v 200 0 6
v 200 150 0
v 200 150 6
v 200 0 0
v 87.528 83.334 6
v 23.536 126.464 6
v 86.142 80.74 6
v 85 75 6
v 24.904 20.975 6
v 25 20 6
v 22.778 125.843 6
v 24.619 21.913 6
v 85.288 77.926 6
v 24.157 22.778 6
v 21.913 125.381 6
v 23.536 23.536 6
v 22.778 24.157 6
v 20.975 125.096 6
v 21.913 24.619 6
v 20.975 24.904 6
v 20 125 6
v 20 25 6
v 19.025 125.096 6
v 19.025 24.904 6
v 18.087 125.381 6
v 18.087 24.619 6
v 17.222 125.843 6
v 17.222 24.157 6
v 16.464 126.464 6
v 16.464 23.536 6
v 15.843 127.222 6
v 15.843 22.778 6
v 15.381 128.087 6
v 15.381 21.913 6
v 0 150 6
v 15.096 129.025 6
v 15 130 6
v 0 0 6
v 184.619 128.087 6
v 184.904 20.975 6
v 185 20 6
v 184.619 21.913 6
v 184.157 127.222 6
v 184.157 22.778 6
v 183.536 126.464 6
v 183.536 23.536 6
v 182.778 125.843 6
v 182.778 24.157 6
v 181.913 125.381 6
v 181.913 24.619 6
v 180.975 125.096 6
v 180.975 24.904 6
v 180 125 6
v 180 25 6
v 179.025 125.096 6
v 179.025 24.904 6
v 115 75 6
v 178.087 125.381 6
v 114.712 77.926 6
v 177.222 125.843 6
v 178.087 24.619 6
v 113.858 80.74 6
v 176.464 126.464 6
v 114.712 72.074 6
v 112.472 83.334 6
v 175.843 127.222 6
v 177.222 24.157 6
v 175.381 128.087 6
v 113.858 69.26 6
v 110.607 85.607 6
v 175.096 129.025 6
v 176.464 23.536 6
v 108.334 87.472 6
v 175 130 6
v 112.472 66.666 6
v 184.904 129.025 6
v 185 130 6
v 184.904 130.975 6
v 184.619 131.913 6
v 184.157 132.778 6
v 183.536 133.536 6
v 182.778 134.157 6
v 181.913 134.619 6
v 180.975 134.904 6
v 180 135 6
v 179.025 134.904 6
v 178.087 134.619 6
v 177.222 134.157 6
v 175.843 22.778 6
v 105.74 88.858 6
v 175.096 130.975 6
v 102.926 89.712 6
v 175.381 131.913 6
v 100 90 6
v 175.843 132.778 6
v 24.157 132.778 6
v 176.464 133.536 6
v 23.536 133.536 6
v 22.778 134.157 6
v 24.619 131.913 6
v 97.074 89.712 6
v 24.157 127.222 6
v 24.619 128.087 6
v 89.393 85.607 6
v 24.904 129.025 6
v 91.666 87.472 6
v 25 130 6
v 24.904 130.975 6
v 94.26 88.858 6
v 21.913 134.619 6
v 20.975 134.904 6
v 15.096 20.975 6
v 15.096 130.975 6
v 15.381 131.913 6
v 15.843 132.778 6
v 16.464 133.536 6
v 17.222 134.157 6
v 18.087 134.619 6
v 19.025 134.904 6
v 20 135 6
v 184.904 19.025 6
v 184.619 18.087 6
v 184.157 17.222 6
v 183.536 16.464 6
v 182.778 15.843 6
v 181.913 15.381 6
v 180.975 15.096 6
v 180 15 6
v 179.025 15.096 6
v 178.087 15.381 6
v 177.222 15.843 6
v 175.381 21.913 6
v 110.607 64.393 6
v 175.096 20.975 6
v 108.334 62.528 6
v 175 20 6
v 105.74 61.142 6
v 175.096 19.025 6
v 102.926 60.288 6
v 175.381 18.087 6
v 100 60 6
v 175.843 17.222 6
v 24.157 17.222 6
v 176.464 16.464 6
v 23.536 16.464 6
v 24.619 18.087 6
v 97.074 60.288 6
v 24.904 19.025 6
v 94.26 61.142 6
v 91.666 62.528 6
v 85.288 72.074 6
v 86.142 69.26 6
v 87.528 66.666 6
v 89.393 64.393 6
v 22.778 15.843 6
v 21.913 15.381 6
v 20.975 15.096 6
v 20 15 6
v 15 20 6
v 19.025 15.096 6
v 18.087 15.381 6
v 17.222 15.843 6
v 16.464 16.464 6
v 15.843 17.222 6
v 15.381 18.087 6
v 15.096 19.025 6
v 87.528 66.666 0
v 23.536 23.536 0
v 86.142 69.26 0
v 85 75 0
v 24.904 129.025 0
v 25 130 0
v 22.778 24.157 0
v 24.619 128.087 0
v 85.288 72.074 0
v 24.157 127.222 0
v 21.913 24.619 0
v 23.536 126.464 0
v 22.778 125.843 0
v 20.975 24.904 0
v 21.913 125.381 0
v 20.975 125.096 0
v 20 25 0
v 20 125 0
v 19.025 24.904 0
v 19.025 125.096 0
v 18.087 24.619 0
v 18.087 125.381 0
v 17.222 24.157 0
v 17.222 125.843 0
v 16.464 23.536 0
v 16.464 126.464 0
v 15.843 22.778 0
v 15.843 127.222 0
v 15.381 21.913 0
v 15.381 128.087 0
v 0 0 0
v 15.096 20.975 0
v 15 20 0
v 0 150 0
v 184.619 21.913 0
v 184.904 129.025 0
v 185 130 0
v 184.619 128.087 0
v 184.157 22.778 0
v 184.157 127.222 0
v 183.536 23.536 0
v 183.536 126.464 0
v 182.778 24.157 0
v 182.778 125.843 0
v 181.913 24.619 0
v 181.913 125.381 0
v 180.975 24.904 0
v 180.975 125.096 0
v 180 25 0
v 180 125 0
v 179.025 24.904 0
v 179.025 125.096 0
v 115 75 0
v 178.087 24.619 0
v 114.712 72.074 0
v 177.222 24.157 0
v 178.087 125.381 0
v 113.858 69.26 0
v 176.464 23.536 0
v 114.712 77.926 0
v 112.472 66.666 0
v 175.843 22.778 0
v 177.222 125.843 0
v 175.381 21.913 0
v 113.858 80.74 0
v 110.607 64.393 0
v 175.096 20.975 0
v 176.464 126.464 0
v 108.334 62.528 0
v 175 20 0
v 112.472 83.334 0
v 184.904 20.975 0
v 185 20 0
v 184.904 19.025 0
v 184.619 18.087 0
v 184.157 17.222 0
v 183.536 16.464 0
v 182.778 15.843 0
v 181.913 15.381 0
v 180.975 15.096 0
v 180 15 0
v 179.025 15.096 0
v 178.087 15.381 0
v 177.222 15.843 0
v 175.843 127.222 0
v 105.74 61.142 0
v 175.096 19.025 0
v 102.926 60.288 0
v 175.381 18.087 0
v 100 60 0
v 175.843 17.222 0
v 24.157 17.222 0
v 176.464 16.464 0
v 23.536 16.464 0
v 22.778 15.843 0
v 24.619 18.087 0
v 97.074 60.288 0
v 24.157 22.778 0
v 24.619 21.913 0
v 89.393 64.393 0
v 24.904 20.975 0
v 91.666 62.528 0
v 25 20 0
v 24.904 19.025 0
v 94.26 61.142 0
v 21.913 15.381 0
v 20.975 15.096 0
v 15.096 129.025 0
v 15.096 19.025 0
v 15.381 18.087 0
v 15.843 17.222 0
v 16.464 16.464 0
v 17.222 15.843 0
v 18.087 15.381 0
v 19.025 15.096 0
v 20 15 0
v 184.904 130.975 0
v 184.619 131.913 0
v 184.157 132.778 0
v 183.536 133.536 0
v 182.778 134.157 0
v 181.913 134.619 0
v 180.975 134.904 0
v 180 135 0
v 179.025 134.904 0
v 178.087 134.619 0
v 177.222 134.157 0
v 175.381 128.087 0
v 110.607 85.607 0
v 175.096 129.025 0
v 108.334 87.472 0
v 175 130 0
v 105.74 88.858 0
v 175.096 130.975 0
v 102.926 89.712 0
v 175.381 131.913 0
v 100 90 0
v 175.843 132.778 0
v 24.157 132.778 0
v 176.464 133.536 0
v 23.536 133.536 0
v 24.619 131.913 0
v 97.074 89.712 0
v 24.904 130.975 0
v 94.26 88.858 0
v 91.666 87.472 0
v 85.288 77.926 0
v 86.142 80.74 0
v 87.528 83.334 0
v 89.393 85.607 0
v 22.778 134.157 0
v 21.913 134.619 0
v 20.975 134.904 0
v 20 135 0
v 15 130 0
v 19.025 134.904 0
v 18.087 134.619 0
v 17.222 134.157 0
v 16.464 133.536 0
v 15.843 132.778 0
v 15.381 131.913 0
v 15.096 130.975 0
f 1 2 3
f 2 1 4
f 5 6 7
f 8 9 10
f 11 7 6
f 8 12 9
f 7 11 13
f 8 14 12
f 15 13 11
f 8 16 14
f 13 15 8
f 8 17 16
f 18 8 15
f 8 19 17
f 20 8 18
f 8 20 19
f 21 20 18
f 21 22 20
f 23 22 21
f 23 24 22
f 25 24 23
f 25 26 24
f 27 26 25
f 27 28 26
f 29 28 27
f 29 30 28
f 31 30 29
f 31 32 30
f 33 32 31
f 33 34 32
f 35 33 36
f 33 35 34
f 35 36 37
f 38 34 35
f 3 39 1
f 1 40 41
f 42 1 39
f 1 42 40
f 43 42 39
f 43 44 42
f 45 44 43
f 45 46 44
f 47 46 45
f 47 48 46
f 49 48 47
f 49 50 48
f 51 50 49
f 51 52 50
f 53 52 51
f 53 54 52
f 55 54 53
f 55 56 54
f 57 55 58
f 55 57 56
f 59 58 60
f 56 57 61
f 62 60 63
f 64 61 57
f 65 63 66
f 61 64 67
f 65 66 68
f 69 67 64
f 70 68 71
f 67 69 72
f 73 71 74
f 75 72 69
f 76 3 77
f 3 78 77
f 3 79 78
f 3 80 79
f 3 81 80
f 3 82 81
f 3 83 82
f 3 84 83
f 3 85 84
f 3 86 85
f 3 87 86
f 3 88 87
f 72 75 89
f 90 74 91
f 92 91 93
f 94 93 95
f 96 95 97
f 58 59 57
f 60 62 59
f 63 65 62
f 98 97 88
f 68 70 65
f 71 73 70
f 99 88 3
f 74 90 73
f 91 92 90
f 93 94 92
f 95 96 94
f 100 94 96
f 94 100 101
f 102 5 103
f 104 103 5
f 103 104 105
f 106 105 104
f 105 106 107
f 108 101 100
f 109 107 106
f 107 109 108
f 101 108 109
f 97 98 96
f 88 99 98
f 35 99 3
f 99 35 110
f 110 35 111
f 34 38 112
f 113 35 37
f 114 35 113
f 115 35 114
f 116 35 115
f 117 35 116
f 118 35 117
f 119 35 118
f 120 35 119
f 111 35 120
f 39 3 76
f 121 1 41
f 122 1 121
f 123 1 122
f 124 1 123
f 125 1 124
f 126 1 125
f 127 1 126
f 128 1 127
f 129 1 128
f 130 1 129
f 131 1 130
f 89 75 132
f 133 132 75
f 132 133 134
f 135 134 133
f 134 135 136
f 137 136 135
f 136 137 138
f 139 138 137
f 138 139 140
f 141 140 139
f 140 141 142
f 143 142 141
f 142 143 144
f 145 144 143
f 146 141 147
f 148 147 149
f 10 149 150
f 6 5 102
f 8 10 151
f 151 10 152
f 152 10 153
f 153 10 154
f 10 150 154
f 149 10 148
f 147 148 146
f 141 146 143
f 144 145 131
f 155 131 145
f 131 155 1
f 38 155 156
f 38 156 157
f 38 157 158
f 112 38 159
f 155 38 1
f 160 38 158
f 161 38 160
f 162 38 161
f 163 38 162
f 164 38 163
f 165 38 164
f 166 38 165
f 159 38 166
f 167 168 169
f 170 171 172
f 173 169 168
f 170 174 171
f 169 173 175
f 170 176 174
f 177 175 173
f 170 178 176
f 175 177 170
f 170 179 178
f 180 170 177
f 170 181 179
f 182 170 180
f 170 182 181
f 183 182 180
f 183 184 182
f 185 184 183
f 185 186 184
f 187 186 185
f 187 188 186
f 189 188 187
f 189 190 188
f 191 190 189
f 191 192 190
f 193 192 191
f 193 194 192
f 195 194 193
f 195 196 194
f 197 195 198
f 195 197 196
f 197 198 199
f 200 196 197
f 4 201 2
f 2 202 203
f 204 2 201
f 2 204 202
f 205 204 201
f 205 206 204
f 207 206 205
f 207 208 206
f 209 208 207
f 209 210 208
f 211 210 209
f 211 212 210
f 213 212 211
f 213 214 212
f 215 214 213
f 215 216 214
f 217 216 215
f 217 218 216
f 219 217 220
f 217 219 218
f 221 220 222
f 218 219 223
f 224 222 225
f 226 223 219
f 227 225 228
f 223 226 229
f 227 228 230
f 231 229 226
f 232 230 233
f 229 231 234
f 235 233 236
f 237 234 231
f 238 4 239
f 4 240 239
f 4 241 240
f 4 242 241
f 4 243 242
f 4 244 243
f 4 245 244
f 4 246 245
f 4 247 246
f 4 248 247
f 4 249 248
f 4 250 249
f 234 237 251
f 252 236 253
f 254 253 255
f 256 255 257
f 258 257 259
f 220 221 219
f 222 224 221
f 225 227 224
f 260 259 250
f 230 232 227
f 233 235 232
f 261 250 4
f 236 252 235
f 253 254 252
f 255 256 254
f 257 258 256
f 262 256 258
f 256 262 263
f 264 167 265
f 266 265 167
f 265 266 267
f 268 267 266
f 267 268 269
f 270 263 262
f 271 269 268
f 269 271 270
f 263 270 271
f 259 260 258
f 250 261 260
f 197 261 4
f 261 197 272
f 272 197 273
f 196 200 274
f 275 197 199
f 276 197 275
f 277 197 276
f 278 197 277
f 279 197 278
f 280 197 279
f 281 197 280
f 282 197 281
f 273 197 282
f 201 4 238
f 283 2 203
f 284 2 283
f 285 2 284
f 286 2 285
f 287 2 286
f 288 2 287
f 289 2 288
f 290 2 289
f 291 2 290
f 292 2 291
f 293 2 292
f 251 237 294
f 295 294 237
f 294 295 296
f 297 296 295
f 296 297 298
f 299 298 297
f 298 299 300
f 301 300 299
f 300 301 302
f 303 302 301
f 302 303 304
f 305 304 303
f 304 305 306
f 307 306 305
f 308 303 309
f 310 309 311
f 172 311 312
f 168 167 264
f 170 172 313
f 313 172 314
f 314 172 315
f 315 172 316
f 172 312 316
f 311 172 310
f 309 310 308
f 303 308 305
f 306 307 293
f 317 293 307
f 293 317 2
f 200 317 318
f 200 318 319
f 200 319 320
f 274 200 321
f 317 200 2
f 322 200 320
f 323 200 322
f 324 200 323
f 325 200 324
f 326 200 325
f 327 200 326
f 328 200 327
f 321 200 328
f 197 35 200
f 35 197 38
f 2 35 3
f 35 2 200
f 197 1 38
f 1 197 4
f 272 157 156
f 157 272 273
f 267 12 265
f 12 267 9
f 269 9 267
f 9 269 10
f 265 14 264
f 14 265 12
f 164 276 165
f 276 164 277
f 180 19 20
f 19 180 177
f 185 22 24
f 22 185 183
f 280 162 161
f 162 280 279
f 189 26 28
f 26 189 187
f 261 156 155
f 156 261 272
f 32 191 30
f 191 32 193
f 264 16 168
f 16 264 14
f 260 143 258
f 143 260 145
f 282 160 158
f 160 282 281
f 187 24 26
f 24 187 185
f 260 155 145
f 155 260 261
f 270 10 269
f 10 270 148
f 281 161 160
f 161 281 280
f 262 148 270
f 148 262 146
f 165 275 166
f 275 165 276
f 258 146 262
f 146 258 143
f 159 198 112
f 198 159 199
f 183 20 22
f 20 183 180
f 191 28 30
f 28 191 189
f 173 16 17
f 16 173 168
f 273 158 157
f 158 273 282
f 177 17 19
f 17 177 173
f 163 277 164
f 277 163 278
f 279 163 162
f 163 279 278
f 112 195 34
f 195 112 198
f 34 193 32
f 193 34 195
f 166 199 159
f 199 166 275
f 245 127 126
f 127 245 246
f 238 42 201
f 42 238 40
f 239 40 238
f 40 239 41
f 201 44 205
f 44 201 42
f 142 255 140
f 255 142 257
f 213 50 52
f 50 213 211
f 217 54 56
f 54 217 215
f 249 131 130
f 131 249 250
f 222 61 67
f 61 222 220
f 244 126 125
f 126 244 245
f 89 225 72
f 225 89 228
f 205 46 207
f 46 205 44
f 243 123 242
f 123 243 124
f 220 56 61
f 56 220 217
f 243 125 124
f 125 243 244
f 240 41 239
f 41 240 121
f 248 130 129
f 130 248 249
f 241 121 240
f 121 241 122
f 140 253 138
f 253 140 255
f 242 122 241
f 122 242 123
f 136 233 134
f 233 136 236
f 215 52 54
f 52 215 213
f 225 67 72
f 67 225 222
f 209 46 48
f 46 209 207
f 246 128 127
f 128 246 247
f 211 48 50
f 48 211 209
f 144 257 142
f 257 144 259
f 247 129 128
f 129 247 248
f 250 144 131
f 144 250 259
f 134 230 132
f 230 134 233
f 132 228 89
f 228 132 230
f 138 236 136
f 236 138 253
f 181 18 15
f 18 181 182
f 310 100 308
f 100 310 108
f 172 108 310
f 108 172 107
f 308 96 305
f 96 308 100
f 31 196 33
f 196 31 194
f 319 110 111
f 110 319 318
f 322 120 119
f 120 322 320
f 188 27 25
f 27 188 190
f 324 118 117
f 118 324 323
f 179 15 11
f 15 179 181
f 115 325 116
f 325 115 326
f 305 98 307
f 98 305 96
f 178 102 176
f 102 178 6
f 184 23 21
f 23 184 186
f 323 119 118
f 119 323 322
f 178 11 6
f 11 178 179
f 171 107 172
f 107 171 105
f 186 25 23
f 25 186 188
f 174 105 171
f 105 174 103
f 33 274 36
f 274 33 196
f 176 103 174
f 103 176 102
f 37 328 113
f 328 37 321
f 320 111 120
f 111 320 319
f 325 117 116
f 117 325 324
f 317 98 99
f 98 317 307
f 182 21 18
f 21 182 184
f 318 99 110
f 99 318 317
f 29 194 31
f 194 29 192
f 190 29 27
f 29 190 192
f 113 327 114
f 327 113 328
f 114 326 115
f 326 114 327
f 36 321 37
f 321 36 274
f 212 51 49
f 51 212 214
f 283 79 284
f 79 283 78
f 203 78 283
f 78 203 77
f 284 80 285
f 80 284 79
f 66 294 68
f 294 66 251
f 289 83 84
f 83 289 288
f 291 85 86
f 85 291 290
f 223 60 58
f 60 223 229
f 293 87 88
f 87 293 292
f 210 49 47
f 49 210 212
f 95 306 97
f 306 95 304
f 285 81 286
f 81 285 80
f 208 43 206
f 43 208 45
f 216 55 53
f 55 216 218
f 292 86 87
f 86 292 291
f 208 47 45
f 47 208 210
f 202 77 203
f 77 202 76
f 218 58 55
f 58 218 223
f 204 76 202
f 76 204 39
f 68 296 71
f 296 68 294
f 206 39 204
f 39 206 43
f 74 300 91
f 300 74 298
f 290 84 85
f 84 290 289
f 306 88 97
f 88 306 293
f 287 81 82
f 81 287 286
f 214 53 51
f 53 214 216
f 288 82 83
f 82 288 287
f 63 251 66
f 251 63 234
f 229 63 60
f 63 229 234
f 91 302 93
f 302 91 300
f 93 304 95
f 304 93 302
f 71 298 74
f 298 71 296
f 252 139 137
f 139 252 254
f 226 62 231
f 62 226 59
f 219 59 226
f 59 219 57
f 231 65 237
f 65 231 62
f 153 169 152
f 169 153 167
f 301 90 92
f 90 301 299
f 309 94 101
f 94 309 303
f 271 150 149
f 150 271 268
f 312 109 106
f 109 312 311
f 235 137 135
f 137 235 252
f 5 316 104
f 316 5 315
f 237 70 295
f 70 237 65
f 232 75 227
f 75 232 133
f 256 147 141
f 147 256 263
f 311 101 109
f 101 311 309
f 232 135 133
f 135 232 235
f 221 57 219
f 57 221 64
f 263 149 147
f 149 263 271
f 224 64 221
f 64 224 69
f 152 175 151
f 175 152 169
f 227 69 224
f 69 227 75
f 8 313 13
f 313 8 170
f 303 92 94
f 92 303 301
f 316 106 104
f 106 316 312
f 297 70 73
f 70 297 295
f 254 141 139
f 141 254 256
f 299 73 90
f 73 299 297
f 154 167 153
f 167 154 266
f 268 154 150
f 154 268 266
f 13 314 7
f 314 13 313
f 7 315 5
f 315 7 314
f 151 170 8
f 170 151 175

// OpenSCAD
$fn = 32;

// ----------------------------------------------------------------------
// Big plate: 200-250 mm adapter plate
// ----------------------------------------------------------------------

// --- parameters (mm) ---
plate_l = 200;            // plate length, X
plate_w = 150;            // plate width, Y
plate_t = 6;              // plate thickness, Z
corner_d = 10;            // corner hole diameter
corner_in = 20;           // corner hole inset from the edges
bore_d = 30;              // central bore

difference() {
  cube([plate_l, plate_w, plate_t]);
  translate([corner_in, corner_in, -1]) cylinder(h = plate_t + 2, d = corner_d);
  translate([plate_l - corner_in, corner_in, -1]) cylinder(h = plate_t + 2, d = corner_d);
  translate([corner_in, plate_w - corner_in, -1]) cylinder(h = plate_t + 2, d = corner_d);
  translate([plate_l - corner_in, plate_w - corner_in, -1]) cylinder(h = plate_t + 2, d = corner_d);
  translate([plate_l / 2, plate_w / 2, -1]) cylinder(h = plate_t + 2, d = bore_d);
}
